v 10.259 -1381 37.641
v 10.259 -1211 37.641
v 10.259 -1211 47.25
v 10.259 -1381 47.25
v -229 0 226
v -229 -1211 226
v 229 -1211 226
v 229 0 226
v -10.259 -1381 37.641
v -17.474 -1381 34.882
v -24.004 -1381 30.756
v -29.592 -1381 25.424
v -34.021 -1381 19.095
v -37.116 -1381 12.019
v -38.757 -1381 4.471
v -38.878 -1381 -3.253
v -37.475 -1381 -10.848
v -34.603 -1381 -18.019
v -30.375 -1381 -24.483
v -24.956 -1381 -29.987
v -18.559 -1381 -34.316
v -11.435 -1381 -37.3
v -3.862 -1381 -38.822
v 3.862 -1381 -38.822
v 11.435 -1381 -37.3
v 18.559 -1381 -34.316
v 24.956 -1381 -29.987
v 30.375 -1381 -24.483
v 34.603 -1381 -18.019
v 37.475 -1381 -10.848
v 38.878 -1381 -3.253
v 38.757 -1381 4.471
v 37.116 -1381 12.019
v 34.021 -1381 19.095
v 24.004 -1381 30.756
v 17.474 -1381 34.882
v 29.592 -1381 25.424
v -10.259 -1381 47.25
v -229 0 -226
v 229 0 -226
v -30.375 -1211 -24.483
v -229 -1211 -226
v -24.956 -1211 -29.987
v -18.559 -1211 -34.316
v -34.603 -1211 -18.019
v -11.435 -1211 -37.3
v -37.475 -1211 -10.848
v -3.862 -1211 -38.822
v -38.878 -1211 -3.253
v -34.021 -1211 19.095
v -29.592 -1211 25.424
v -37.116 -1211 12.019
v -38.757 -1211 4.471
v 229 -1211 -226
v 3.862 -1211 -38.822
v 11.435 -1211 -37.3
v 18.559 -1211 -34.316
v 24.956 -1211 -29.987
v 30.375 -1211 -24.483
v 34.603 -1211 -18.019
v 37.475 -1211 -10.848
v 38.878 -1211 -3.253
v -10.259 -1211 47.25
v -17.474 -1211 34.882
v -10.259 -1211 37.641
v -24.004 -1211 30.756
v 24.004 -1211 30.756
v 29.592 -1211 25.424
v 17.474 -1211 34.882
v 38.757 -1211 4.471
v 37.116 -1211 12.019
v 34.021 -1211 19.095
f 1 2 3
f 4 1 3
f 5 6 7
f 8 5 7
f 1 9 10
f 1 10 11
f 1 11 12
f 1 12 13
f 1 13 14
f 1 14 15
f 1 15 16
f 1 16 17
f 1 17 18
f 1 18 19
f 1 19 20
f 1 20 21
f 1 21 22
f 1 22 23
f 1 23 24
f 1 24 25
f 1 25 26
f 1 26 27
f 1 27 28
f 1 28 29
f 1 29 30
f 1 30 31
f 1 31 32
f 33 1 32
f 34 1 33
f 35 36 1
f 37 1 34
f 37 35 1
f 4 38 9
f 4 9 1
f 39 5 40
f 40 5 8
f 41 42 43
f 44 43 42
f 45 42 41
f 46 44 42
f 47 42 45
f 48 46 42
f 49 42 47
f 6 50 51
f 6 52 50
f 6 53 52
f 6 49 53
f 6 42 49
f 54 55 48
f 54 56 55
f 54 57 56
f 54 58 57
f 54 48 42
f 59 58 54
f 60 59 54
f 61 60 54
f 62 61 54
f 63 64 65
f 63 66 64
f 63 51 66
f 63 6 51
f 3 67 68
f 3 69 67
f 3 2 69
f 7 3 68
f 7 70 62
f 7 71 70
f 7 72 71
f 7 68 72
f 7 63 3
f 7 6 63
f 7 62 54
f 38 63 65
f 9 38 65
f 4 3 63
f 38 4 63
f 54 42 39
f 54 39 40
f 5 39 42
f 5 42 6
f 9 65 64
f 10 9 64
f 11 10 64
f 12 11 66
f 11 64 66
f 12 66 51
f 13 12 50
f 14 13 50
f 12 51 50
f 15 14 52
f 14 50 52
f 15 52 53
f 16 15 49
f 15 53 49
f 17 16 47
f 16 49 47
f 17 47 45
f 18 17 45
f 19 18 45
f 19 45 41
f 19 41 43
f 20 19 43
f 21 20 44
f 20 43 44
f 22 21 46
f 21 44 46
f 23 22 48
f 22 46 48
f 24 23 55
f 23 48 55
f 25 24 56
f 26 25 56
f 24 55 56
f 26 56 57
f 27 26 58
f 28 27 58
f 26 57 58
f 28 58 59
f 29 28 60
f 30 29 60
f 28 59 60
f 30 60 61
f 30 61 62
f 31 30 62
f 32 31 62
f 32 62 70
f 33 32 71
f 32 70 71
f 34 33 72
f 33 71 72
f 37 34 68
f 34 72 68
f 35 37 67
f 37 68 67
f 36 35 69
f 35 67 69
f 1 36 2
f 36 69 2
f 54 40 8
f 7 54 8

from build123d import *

# Parameters (mm, degrees)
F0_W     = 458.0001
F0_H     = 452.00062
F1_DEPTH = 1211.000118
F3_DEPTH = 169.999914


with BuildPart() as f1:
    # F0 (on Front) → F1 (new body)
    with BuildSketch(Plane.XZ):
        Rectangle(F0_W, F0_H)
    extrude(amount=F1_DEPTH)

    # F2 (on face) → F3 (join)
    with BuildSketch(Plane.XZ.offset(1211.000118)):
        with BuildLine():
            ThreePointArc((-10.259218514, 37.6406649164), (-23.6835473139, -31.0025935447), (39.0137311708, 0))
            ThreePointArc((39.0137311708, 0), (31.0025935447, 23.6835473139), (10.259218514, 37.6406649164))
            Line((10.259218514, 37.6406649164), (10.259218514, 30.7776723057))
            Line((10.259218514, 30.7776723057), (-10.259218514, 30.7776723057))
            Line((-10.259218514, 30.7776723057), (-10.259218514, 37.6406649164))
        make_face()
        with BuildLine():
            Line((10.259218514, 30.7776723057), (10.259218514, 37.6406649164))
            ThreePointArc((10.259218514, 37.6406649164), (0, 39.0137311708), (-10.259218514, 37.6406649164))
            Line((-10.259218514, 37.6406649164), (-10.259218514, 30.7776723057))
            Line((-10.259218514, 30.7776723057), (10.259218514, 30.7776723057))
        make_face()
        with BuildLine():
            ThreePointArc((-10.259218514, 37.6406649164), (0, 39.0137311708), (10.259218514, 37.6406649164))
            Line((10.259218514, 37.6406649164), (10.259218514, 47.2497900359))
            Line((10.259218514, 47.2497900359), (-10.259218514, 47.2497900359))
            Line((-10.259218514, 47.2497900359), (-10.259218514, 37.6406649164))
        make_face()
    extrude(amount=F3_DEPTH)


solid = f1.part
